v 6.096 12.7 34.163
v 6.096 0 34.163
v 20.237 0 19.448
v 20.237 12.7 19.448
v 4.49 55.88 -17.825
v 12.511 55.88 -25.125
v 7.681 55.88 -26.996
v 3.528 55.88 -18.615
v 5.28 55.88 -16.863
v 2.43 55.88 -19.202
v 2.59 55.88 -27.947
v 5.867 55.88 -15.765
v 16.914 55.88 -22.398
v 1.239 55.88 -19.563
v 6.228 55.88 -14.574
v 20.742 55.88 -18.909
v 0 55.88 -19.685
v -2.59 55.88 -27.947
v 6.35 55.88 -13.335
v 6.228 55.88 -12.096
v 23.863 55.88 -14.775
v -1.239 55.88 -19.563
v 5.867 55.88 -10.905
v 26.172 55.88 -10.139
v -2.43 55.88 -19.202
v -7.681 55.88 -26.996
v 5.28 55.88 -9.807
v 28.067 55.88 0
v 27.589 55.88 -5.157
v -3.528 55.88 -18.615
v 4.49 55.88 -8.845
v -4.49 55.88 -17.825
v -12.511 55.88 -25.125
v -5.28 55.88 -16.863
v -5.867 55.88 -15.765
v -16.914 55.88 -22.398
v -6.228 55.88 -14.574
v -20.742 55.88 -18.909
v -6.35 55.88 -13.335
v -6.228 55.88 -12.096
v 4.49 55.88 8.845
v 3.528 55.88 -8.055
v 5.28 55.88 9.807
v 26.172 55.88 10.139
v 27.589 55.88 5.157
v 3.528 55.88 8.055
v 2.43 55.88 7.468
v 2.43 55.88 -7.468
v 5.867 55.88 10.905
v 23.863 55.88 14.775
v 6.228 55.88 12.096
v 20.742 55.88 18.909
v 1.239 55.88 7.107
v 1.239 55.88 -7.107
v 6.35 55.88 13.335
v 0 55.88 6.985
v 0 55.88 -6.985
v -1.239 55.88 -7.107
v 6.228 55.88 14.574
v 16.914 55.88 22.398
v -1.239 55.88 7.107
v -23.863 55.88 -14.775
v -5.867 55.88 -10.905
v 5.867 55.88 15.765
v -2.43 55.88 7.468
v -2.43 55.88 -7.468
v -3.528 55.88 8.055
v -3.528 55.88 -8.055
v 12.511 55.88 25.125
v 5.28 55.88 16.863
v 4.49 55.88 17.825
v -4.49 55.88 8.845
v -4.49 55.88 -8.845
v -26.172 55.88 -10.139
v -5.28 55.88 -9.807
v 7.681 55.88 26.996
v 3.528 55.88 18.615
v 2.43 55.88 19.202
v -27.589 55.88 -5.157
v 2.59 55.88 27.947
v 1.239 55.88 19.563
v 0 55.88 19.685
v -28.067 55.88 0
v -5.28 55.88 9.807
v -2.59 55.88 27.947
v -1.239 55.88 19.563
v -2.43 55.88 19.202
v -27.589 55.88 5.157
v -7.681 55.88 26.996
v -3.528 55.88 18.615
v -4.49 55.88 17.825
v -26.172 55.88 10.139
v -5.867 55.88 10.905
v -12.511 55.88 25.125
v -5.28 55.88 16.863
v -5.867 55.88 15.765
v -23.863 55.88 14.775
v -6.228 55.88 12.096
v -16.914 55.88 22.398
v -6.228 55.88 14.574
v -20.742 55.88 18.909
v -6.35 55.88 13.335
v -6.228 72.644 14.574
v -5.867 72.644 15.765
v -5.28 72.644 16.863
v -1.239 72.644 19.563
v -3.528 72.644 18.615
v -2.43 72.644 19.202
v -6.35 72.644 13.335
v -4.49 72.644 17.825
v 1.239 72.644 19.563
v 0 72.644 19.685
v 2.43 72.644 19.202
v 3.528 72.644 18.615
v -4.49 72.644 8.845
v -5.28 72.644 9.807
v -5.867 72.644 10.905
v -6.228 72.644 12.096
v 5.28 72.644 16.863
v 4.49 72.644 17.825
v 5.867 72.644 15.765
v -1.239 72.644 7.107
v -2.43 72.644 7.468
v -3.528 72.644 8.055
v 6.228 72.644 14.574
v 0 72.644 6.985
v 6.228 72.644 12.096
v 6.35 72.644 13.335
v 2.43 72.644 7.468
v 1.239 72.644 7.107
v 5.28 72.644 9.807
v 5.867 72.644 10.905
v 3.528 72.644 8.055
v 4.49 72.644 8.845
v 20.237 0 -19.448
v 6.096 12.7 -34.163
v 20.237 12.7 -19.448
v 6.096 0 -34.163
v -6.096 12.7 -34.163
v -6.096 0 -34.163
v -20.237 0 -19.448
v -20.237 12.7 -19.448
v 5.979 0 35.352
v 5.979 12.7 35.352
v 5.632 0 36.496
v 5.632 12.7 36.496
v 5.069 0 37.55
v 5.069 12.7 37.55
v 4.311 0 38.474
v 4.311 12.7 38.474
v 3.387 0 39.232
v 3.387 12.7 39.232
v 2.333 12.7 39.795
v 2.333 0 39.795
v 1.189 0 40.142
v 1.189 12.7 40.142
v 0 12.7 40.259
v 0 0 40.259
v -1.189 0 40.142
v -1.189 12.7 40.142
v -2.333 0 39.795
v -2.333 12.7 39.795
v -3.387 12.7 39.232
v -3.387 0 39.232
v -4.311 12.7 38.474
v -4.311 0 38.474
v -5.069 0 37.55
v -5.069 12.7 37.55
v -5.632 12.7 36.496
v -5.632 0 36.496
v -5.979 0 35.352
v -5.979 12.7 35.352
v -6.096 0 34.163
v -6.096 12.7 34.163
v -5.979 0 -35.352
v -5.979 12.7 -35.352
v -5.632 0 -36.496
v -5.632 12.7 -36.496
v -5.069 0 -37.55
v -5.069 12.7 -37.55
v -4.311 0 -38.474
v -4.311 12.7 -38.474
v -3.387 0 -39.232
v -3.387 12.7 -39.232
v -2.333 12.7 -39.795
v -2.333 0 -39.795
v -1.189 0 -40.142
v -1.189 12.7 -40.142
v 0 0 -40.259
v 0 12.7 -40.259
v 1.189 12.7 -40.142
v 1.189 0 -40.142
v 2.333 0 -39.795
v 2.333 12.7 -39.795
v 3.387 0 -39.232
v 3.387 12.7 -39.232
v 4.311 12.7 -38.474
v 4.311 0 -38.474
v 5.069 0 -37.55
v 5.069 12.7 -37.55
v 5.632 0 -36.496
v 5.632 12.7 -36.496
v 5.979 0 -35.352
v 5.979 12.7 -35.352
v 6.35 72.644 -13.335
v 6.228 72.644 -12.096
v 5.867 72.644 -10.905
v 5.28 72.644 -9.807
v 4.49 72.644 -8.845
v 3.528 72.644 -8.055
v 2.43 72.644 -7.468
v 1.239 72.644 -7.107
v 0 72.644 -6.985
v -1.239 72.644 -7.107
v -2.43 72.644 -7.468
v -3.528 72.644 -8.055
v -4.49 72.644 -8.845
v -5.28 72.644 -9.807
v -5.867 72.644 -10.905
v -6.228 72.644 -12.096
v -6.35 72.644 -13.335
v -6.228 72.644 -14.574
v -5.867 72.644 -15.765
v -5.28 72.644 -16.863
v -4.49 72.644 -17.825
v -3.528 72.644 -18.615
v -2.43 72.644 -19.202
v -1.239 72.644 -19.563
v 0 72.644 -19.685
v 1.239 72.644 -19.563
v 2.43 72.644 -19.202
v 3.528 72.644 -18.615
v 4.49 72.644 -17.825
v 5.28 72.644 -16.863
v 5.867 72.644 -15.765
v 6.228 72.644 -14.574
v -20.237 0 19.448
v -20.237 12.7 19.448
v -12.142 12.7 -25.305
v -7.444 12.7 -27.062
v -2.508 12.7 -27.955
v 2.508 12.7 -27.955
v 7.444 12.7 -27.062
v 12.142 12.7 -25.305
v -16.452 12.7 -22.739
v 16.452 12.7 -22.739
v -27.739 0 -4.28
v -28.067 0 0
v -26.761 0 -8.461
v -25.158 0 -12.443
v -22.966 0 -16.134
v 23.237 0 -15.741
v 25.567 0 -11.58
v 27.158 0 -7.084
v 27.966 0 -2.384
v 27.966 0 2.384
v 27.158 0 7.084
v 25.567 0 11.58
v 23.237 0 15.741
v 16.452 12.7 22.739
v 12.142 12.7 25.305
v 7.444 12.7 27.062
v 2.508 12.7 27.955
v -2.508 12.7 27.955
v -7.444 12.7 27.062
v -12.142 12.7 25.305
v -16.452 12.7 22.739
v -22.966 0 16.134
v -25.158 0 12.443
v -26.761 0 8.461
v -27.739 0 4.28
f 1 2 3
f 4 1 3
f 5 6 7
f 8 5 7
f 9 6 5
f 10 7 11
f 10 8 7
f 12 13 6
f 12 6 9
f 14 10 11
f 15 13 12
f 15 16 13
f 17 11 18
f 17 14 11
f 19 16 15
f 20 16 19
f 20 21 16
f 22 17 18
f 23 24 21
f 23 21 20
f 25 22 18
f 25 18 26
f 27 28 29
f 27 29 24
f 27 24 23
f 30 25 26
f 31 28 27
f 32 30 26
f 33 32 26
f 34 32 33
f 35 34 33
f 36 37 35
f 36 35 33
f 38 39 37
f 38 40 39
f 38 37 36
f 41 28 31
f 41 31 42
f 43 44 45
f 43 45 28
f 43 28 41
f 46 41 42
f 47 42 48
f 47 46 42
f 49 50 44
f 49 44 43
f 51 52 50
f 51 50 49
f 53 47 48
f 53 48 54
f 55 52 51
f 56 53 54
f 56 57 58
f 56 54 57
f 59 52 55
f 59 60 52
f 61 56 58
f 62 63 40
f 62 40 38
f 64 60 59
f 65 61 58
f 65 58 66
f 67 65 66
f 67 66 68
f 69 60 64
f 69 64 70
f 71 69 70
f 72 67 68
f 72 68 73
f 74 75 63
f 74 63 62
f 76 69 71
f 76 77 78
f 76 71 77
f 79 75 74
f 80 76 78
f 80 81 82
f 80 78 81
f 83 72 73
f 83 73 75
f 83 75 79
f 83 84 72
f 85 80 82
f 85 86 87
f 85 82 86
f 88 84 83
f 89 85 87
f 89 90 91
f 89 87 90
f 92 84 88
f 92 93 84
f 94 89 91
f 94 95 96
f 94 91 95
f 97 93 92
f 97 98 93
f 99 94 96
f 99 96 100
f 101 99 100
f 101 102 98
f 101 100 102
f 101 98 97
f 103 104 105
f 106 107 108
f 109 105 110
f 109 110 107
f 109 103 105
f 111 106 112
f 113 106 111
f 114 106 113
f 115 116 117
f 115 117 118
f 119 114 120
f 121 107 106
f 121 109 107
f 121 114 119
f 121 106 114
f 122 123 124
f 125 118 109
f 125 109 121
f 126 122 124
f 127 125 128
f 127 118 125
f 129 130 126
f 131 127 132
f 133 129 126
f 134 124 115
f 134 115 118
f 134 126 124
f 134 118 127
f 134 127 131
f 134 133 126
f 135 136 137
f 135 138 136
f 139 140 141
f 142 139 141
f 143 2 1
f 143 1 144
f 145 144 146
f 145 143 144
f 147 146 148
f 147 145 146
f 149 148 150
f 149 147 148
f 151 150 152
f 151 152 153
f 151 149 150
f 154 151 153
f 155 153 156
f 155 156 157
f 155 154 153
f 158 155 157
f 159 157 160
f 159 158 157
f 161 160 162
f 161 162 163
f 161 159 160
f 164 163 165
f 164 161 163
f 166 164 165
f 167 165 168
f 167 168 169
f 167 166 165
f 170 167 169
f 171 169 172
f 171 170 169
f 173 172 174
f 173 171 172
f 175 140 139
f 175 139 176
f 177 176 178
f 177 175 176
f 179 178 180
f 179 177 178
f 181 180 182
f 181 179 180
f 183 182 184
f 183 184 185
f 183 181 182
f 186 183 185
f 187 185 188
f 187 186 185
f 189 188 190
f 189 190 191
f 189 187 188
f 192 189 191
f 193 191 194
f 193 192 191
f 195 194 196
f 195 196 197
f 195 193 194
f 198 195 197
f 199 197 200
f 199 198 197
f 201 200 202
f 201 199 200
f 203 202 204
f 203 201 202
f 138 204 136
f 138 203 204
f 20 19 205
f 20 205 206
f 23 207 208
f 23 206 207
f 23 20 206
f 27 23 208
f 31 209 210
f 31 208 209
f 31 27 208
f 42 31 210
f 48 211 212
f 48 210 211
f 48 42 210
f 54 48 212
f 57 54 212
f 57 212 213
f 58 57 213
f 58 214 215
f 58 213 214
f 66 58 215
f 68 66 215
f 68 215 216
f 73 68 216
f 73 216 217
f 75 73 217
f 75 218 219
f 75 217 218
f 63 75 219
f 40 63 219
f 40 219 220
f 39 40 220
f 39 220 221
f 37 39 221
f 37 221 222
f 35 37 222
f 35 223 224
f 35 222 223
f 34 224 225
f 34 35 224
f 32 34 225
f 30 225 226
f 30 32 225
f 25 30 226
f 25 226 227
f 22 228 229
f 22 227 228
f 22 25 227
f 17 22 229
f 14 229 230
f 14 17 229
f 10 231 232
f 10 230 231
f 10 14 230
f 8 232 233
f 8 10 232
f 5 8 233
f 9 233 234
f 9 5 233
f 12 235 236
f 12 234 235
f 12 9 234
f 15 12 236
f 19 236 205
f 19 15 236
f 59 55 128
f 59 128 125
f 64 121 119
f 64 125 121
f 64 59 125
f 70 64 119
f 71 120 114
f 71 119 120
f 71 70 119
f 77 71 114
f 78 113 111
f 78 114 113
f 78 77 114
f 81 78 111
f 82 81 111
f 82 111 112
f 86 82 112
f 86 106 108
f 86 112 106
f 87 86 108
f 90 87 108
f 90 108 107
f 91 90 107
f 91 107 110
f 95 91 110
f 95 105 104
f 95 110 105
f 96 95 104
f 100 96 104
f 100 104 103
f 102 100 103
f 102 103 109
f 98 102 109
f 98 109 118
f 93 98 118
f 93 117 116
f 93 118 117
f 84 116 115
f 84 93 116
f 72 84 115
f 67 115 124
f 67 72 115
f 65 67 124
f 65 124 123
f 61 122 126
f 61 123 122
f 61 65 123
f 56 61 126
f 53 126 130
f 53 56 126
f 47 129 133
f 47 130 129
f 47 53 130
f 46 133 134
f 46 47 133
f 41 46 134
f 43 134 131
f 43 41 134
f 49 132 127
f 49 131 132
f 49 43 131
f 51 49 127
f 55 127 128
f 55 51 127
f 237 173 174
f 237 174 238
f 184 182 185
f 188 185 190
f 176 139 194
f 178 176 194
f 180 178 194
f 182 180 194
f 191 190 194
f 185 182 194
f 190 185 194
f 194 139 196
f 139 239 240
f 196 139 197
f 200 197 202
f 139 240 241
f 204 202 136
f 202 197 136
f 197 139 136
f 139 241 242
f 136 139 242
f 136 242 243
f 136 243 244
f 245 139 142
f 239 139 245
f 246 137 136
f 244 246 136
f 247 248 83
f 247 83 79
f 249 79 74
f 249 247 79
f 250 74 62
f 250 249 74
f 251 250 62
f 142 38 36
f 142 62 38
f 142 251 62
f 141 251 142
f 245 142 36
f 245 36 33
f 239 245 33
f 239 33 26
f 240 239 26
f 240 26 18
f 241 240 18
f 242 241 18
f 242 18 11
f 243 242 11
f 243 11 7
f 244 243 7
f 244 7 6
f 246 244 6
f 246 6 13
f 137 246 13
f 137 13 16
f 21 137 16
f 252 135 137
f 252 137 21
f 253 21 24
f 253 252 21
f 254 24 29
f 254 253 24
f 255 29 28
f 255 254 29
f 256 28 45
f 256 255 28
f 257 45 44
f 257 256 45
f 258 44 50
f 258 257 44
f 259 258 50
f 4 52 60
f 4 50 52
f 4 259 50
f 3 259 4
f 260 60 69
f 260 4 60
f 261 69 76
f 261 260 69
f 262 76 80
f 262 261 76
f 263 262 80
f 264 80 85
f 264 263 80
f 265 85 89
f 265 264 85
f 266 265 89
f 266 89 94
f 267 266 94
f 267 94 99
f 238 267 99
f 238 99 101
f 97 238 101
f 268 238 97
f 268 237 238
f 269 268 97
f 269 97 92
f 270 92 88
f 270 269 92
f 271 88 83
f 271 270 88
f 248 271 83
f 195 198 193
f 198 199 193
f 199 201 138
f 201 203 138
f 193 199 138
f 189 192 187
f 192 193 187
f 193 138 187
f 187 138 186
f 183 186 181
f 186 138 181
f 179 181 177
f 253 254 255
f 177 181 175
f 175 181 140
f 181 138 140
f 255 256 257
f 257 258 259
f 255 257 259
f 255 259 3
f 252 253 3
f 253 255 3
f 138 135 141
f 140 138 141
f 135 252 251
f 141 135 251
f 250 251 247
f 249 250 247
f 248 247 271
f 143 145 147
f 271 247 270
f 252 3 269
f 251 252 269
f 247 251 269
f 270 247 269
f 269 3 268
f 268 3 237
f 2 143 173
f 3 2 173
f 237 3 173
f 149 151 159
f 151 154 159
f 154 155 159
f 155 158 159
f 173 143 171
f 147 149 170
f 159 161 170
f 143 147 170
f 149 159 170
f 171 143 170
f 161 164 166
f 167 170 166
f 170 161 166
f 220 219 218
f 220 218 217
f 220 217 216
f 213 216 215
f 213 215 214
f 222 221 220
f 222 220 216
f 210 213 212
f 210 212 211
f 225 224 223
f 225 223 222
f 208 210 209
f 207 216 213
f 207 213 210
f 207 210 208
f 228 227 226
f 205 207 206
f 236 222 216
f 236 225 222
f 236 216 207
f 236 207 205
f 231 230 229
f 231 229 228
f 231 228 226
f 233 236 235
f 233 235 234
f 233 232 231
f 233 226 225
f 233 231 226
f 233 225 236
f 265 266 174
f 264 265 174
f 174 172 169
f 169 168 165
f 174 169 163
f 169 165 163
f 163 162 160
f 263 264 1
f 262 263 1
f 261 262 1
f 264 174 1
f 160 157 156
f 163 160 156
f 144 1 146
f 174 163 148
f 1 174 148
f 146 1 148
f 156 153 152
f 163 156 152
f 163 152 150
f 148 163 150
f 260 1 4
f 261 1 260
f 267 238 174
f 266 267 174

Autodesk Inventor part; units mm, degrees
ref_plane "YZ Plane" through (0, 0, 0) normal (1, 0, 0) x (0, 1, 0)
ref_plane "XZ Plane" through (0, 0, 0) normal (0, 1, 0) x (-1, 0, 0)
ref_plane "XY Plane" through (0, 0, 0) normal (0, 0, 1) x (1, 0, 0)
sketch "Sketch1" plane through (0, 0, 0) normal (0, 1, 0) x (-1, 0, 0)
  circle A0 centre (0, 0) radius 28.067
  dimension "d0" = 56.134
extrude "Extrusion1" add sketch "Sketch1" along normal blind 55.88
sketch "Sketch2" plane through (0, 55.88, 0) normal (0, 1, 0) x (1, 0, 0)
  circle A0 centre (0, -13.335) radius 6.35
  circle A1 centre (0, 13.335) radius 6.35
  point P0 (0, 0)
  dimension "d5" = 12.7
  dimension "d6" = 12.7
extrude "Extrusion2" add sketch "Sketch2" along normal blind 16.764
sketch "Sketch3" plane through (0, 0, 0) normal (0, -1, 0) x (1, 0, 0)
  circle A0 centre (0, 0) radius 28.067 projected
  circle A1 centre (0, 34.163) radius 6.096
  circle A2 centre (0, -34.163) radius 6.096
  line L0 (6.096, 34.163) -> (20.2372, 19.4477)
  line L1 (6.096, -34.163) -> (20.2372, -19.4477)
  line L2 (-6.096, 34.163) -> (-20.2372, 19.4477)
  line L3 (-6.096, -34.163) -> (-20.2372, -19.4477)
extrude "Extrusion3" add sketch "Sketch3" against normal blind 12.7 contours A0 A1 L0 | A0 L2 A1 | A1
sketch "Sketch4" plane through (0, 0, 0) normal (0, -1, 0) x (1, 0, 0)
  circle A0 centre (0, 0) radius 28.067 projected
  circle A1 centre (0, -34.163) radius 6.096
  line L0 (6.096, -34.163) -> (20.2372, -19.4477)
  line L1 (-6.096, -34.163) -> (-20.2372, -19.4477)
extrude "Extrusion4" add sketch "Sketch4" against normal blind 12.7
properties part number "Precharge_Relay"
